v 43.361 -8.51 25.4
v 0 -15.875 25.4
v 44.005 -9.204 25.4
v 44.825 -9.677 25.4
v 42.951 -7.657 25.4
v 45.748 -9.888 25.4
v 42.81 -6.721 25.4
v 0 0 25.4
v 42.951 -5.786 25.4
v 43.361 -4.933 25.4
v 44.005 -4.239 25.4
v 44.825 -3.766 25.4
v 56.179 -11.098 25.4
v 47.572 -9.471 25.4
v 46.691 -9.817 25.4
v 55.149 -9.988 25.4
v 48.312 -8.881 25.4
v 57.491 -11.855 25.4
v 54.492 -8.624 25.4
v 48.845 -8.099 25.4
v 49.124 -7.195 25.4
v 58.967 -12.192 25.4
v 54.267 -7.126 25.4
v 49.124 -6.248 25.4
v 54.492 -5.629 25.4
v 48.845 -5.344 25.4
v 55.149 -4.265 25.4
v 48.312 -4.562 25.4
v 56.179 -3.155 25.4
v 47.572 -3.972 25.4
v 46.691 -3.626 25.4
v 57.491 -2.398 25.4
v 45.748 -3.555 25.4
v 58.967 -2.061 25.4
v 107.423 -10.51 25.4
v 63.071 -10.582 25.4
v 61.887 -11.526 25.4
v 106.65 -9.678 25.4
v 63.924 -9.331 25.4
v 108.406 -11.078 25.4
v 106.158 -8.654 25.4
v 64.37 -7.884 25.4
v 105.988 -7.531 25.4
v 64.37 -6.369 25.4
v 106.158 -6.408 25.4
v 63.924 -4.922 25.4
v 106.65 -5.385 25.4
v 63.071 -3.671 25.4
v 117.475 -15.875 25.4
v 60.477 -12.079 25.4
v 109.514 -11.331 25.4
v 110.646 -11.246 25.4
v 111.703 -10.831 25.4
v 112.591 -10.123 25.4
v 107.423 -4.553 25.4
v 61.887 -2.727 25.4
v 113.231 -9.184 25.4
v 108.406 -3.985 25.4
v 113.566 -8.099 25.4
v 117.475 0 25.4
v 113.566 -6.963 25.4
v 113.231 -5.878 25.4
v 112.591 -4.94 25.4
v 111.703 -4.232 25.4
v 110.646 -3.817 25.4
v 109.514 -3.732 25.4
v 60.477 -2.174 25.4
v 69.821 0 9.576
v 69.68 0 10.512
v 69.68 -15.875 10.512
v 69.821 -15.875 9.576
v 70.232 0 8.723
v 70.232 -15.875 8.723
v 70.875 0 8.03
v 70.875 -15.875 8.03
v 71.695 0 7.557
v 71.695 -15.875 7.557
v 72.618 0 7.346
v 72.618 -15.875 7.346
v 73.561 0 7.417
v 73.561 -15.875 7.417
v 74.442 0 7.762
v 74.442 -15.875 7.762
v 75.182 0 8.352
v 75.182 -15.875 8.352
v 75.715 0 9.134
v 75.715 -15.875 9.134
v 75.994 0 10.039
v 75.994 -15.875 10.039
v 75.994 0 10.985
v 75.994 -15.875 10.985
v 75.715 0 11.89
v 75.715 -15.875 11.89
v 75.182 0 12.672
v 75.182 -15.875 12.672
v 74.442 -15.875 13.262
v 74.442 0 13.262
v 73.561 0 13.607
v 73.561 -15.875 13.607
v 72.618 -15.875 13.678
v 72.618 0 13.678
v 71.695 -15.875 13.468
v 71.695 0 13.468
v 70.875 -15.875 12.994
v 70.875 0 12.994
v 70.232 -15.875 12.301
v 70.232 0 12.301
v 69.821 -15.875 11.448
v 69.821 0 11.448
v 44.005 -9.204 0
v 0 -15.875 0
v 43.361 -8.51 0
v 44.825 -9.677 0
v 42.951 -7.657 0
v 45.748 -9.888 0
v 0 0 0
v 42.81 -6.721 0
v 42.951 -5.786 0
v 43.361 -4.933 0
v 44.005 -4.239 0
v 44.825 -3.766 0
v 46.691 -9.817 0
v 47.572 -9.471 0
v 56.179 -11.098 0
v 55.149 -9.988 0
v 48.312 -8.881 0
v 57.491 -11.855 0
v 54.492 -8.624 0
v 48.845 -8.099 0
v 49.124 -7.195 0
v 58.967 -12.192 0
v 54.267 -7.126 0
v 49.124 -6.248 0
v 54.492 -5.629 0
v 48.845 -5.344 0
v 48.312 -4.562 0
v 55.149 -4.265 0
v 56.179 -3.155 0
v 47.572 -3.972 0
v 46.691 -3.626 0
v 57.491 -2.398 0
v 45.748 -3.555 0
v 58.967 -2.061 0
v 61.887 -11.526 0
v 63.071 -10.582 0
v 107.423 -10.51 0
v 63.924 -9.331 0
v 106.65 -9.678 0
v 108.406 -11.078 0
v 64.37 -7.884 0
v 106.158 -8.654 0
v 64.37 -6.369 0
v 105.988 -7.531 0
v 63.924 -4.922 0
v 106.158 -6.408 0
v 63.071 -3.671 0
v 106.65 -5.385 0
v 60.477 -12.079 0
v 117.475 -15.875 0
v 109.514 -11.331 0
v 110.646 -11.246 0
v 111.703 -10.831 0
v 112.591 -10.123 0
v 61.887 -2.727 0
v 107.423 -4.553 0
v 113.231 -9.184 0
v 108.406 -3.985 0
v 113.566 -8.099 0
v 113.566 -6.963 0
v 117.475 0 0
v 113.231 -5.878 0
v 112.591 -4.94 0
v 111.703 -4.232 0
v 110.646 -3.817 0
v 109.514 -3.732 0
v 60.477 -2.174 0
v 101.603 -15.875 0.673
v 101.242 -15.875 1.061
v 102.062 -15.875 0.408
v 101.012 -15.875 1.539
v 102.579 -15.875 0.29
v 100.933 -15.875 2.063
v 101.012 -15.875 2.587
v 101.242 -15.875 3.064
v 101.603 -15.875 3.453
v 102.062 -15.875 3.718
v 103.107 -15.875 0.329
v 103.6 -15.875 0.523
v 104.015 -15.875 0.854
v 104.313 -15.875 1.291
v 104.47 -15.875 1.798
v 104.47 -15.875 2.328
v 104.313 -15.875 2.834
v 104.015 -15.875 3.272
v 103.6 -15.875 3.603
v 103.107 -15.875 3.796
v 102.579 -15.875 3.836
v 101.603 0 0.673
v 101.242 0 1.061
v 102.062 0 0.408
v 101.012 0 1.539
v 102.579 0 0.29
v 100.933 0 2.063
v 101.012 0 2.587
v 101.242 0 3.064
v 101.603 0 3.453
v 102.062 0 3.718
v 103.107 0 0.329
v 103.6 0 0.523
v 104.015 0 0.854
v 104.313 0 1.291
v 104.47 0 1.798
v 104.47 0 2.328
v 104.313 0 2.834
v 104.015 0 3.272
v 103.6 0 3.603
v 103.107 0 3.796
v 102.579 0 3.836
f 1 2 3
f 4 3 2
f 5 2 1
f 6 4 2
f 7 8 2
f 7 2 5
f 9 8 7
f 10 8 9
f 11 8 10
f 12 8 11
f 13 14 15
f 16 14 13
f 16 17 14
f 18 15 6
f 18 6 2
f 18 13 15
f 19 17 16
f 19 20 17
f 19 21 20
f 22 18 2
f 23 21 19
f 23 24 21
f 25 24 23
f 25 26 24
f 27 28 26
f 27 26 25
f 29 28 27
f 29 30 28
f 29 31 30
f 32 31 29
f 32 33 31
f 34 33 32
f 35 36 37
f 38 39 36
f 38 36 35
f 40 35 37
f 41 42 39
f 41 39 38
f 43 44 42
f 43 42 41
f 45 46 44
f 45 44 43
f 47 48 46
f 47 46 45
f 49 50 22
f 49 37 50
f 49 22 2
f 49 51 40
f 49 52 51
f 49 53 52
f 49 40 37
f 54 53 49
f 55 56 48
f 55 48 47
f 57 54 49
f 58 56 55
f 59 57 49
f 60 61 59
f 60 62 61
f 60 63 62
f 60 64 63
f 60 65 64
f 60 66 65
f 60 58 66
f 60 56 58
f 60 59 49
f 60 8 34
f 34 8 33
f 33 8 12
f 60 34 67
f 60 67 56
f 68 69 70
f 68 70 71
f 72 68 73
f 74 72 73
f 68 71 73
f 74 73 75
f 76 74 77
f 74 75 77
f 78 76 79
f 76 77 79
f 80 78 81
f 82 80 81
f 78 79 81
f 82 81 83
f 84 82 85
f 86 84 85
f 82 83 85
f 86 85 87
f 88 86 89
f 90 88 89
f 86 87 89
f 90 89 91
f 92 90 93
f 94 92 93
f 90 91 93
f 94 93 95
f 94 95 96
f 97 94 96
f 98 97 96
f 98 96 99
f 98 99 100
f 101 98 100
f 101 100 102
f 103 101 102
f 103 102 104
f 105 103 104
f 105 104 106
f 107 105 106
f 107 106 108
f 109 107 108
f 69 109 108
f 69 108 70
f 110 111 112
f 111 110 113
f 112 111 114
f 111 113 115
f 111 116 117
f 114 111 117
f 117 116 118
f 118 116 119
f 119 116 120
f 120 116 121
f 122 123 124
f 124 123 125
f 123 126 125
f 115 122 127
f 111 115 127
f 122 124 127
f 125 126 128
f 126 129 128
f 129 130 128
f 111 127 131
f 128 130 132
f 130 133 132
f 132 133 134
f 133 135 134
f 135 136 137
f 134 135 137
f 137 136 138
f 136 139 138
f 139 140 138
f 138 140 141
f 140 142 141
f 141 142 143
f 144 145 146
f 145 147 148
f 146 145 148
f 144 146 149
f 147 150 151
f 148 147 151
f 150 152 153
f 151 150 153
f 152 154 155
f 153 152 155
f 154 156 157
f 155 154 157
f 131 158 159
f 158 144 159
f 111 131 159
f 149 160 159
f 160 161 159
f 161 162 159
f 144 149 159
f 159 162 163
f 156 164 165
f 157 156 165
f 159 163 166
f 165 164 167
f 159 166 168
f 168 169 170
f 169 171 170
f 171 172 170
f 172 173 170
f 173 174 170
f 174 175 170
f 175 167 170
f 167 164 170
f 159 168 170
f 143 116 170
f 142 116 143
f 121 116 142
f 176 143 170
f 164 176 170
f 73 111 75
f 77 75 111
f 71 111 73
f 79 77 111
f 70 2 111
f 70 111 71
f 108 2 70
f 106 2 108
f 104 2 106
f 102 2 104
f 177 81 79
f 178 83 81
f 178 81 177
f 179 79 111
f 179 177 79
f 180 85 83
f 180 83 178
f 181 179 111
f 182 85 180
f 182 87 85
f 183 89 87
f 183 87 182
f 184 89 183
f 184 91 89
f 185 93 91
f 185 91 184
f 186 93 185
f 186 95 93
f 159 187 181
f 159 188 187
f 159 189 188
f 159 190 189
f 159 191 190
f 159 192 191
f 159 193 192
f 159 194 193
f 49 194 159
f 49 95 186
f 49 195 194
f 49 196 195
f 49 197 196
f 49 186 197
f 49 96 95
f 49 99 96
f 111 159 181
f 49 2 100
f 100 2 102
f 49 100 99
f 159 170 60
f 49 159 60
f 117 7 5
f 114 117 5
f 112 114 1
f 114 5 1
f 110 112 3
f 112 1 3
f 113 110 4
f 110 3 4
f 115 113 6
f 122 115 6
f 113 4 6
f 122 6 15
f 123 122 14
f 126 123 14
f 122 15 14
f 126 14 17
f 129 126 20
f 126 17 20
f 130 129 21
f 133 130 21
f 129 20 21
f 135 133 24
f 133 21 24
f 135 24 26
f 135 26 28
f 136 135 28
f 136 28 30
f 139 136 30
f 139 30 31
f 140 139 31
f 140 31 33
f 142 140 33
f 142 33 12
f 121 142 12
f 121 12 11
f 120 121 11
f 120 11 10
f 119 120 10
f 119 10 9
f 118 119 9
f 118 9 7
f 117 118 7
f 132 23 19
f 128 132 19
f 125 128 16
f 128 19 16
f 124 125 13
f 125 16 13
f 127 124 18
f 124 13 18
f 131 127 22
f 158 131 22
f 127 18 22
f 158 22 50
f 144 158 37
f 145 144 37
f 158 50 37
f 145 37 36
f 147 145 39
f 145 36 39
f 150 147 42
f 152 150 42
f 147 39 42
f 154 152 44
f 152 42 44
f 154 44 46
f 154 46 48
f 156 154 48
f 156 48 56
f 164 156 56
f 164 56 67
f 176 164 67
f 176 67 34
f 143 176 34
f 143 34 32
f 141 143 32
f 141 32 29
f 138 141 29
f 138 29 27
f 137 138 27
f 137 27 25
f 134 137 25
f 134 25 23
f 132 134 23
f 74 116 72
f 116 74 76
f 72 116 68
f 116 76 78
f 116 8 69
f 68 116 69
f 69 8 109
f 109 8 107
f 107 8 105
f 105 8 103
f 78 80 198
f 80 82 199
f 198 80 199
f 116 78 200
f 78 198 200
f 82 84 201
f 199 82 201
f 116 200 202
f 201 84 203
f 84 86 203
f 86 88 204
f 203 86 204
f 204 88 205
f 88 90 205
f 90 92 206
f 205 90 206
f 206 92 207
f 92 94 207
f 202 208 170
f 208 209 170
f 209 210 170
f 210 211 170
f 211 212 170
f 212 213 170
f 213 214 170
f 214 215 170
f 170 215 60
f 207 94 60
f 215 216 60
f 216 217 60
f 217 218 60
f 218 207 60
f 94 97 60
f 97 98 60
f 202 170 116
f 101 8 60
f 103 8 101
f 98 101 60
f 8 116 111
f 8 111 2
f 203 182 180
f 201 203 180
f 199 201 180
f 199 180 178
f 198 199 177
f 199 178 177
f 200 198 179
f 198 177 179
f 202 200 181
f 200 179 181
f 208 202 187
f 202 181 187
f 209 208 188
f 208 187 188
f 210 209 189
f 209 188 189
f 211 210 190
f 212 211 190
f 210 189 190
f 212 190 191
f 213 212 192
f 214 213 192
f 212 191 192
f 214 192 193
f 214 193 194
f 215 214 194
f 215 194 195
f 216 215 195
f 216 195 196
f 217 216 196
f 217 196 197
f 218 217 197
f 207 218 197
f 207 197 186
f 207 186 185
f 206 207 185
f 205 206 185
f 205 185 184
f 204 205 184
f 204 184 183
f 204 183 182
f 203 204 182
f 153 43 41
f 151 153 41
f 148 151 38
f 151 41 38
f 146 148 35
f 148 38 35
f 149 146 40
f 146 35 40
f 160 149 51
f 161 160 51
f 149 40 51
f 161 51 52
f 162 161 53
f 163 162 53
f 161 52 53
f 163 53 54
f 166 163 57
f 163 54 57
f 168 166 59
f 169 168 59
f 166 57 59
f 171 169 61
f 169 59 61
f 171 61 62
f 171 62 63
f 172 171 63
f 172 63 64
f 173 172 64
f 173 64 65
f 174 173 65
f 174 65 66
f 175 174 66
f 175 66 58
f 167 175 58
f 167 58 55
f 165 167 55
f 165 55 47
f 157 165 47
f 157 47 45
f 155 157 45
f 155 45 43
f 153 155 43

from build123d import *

# Parameters (mm, degrees)
F0_W      = 117.475
F0_H      = 25.4
F1_DEPTH  = 15.875
F3_D      = 6.35
F3_DEPTH  = 177.8
F3_TIP    = 1.9077324654
F5_D      = 10.16
F5_DEPTH  = 177.8
F5_TIP    = 3.0523719447
F7_D      = 7.62
F7_DEPTH  = 177.8
F7_TIP    = 2.2892789585
F9_D      = 6.35
F9_DEPTH  = 177.8
F9_TIP    = 1.9077324654
F11_D     = 3.556
F11_DEPTH = 25.4
F11_TIP   = 1.0683301806


# Not quite as in the source:
# - a feature names something its author has since deleted; it is built from what else it names


with BuildPart() as f1:
    # F0 (on Front) → F1 (new body)
    with BuildSketch(Plane.XZ):
        with Locations((58.7375, 12.7)):
            Rectangle(F0_W, F0_H)
    extrude(amount=F1_DEPTH)

    # F3
    with Locations(Plane(origin=(0, 0, 0), x_dir=(1, 0, 0), z_dir=(0, 0, -1))):
        with Locations((45.984800905, 6.7214882001)):
            Hole(F3_D / 2, depth=F3_DEPTH)
            with Locations((0, 0, -(F3_DEPTH + F3_TIP / 2))):  # 118° drill point
                Cone(0, F3_D / 2, F3_TIP, mode=Mode.SUBTRACT)

    # F5
    with Locations(Plane(origin=(0, 0, 0), x_dir=(1, 0, 0), z_dir=(0, 0, -1))):
        with Locations((59.3467913568, 7.1263969876)):
            Hole(F5_D / 2, depth=F5_DEPTH)
            with Locations((0, 0, -(F5_DEPTH + F5_TIP / 2))):  # 118° drill point
                Cone(0, F5_D / 2, F5_TIP, mode=Mode.SUBTRACT)

    # F7
    with Locations(Plane(origin=(0, 0, 0), x_dir=(1, 0, 0), z_dir=(0, 0, -1))):
        with Locations((109.7984462976, 7.531305775)):
            Hole(F7_D / 2, depth=F7_DEPTH)
            with Locations((0, 0, -(F7_DEPTH + F7_TIP / 2))):  # 118° drill point
                Cone(0, F7_D / 2, F7_TIP, mode=Mode.SUBTRACT)

    # F9
    with Locations(Plane(origin=(0, 0, 0), x_dir=(1, 0, 0), z_dir=(0, 1, 0))):
        with Locations((72.8548616171, -10.5120344087)):
            Hole(F9_D / 2, depth=F9_DEPTH)
            with Locations((0, 0, -(F9_DEPTH + F9_TIP / 2))):  # 118° drill point
                Cone(0, F9_D / 2, F9_TIP, mode=Mode.SUBTRACT)

    # F11
    with Locations(Plane(origin=(0, 0, 0), x_dir=(1, 0, 0), z_dir=(0, 1, 0))):
        with Locations((102.7114540339, -2.0629046485)):
            Hole(F11_D / 2, depth=F11_DEPTH)
            with Locations((0, 0, -(F11_DEPTH + F11_TIP / 2))):  # 118° drill point
                Cone(0, F11_D / 2, F11_TIP, mode=Mode.SUBTRACT)


solid = f1.part
